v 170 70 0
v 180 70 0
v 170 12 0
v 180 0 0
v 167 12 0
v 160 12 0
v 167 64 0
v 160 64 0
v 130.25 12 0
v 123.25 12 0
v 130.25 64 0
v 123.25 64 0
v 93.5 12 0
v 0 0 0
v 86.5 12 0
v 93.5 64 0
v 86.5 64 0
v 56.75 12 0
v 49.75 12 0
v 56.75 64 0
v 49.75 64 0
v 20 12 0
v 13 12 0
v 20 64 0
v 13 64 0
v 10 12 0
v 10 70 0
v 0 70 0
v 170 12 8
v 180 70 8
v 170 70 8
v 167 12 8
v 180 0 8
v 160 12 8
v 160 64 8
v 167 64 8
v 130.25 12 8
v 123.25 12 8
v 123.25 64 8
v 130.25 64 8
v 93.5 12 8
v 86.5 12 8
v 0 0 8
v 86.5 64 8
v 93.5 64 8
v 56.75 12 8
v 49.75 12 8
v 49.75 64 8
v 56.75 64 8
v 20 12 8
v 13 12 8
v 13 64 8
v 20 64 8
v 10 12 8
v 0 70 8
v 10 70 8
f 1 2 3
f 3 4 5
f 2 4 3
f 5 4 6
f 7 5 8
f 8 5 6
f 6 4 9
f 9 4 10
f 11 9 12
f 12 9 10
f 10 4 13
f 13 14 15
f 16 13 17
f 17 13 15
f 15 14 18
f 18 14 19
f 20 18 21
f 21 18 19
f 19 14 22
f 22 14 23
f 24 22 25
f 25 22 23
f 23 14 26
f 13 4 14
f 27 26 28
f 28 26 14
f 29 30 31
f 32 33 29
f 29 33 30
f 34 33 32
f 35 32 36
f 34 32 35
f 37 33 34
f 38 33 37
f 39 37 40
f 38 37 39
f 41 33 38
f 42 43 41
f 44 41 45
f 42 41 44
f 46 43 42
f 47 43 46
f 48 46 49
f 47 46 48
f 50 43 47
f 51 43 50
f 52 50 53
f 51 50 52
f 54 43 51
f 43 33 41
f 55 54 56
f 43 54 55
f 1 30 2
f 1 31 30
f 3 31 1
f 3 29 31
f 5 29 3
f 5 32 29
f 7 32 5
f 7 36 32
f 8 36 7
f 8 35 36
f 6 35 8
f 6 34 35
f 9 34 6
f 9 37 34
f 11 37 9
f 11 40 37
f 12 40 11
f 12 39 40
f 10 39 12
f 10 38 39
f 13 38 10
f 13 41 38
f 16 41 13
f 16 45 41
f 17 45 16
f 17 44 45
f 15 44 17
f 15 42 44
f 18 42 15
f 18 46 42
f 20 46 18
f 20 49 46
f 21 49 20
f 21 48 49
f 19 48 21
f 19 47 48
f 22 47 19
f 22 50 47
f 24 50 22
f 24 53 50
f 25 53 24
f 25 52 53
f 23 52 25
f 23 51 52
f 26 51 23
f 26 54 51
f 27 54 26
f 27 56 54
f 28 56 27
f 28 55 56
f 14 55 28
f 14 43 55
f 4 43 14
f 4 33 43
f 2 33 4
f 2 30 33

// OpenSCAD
$fn = 32;

// ----------------------------------------------------------------------
// Guard grille: 5 slats over a 180 x 70 mm plate
// ----------------------------------------------------------------------

// --- parameters (mm) ---
profile_height = 8;       // extrusion height
profile_points = 28;      // points of the closed outline

profile = [[0, 0], [180, 0], [180, 70], [170, 70], [170, 12], [167, 12], [167, 64], [160, 64], [160, 12], [130.25, 12], [130.25, 64], [123.25, 64], [123.25, 12], [93.5, 12], [93.5, 64], [86.5, 64], [86.5, 12], [56.75, 12], [56.75, 64], [49.75, 64], [49.75, 12], [20, 12], [20, 64], [13, 64], [13, 12], [10, 12], [10, 70], [0, 70]];  // single closed polygon, 28 points, counter clockwise

// --- the one profile operation ---
linear_extrude(height = profile_height) polygon(points = profile);
